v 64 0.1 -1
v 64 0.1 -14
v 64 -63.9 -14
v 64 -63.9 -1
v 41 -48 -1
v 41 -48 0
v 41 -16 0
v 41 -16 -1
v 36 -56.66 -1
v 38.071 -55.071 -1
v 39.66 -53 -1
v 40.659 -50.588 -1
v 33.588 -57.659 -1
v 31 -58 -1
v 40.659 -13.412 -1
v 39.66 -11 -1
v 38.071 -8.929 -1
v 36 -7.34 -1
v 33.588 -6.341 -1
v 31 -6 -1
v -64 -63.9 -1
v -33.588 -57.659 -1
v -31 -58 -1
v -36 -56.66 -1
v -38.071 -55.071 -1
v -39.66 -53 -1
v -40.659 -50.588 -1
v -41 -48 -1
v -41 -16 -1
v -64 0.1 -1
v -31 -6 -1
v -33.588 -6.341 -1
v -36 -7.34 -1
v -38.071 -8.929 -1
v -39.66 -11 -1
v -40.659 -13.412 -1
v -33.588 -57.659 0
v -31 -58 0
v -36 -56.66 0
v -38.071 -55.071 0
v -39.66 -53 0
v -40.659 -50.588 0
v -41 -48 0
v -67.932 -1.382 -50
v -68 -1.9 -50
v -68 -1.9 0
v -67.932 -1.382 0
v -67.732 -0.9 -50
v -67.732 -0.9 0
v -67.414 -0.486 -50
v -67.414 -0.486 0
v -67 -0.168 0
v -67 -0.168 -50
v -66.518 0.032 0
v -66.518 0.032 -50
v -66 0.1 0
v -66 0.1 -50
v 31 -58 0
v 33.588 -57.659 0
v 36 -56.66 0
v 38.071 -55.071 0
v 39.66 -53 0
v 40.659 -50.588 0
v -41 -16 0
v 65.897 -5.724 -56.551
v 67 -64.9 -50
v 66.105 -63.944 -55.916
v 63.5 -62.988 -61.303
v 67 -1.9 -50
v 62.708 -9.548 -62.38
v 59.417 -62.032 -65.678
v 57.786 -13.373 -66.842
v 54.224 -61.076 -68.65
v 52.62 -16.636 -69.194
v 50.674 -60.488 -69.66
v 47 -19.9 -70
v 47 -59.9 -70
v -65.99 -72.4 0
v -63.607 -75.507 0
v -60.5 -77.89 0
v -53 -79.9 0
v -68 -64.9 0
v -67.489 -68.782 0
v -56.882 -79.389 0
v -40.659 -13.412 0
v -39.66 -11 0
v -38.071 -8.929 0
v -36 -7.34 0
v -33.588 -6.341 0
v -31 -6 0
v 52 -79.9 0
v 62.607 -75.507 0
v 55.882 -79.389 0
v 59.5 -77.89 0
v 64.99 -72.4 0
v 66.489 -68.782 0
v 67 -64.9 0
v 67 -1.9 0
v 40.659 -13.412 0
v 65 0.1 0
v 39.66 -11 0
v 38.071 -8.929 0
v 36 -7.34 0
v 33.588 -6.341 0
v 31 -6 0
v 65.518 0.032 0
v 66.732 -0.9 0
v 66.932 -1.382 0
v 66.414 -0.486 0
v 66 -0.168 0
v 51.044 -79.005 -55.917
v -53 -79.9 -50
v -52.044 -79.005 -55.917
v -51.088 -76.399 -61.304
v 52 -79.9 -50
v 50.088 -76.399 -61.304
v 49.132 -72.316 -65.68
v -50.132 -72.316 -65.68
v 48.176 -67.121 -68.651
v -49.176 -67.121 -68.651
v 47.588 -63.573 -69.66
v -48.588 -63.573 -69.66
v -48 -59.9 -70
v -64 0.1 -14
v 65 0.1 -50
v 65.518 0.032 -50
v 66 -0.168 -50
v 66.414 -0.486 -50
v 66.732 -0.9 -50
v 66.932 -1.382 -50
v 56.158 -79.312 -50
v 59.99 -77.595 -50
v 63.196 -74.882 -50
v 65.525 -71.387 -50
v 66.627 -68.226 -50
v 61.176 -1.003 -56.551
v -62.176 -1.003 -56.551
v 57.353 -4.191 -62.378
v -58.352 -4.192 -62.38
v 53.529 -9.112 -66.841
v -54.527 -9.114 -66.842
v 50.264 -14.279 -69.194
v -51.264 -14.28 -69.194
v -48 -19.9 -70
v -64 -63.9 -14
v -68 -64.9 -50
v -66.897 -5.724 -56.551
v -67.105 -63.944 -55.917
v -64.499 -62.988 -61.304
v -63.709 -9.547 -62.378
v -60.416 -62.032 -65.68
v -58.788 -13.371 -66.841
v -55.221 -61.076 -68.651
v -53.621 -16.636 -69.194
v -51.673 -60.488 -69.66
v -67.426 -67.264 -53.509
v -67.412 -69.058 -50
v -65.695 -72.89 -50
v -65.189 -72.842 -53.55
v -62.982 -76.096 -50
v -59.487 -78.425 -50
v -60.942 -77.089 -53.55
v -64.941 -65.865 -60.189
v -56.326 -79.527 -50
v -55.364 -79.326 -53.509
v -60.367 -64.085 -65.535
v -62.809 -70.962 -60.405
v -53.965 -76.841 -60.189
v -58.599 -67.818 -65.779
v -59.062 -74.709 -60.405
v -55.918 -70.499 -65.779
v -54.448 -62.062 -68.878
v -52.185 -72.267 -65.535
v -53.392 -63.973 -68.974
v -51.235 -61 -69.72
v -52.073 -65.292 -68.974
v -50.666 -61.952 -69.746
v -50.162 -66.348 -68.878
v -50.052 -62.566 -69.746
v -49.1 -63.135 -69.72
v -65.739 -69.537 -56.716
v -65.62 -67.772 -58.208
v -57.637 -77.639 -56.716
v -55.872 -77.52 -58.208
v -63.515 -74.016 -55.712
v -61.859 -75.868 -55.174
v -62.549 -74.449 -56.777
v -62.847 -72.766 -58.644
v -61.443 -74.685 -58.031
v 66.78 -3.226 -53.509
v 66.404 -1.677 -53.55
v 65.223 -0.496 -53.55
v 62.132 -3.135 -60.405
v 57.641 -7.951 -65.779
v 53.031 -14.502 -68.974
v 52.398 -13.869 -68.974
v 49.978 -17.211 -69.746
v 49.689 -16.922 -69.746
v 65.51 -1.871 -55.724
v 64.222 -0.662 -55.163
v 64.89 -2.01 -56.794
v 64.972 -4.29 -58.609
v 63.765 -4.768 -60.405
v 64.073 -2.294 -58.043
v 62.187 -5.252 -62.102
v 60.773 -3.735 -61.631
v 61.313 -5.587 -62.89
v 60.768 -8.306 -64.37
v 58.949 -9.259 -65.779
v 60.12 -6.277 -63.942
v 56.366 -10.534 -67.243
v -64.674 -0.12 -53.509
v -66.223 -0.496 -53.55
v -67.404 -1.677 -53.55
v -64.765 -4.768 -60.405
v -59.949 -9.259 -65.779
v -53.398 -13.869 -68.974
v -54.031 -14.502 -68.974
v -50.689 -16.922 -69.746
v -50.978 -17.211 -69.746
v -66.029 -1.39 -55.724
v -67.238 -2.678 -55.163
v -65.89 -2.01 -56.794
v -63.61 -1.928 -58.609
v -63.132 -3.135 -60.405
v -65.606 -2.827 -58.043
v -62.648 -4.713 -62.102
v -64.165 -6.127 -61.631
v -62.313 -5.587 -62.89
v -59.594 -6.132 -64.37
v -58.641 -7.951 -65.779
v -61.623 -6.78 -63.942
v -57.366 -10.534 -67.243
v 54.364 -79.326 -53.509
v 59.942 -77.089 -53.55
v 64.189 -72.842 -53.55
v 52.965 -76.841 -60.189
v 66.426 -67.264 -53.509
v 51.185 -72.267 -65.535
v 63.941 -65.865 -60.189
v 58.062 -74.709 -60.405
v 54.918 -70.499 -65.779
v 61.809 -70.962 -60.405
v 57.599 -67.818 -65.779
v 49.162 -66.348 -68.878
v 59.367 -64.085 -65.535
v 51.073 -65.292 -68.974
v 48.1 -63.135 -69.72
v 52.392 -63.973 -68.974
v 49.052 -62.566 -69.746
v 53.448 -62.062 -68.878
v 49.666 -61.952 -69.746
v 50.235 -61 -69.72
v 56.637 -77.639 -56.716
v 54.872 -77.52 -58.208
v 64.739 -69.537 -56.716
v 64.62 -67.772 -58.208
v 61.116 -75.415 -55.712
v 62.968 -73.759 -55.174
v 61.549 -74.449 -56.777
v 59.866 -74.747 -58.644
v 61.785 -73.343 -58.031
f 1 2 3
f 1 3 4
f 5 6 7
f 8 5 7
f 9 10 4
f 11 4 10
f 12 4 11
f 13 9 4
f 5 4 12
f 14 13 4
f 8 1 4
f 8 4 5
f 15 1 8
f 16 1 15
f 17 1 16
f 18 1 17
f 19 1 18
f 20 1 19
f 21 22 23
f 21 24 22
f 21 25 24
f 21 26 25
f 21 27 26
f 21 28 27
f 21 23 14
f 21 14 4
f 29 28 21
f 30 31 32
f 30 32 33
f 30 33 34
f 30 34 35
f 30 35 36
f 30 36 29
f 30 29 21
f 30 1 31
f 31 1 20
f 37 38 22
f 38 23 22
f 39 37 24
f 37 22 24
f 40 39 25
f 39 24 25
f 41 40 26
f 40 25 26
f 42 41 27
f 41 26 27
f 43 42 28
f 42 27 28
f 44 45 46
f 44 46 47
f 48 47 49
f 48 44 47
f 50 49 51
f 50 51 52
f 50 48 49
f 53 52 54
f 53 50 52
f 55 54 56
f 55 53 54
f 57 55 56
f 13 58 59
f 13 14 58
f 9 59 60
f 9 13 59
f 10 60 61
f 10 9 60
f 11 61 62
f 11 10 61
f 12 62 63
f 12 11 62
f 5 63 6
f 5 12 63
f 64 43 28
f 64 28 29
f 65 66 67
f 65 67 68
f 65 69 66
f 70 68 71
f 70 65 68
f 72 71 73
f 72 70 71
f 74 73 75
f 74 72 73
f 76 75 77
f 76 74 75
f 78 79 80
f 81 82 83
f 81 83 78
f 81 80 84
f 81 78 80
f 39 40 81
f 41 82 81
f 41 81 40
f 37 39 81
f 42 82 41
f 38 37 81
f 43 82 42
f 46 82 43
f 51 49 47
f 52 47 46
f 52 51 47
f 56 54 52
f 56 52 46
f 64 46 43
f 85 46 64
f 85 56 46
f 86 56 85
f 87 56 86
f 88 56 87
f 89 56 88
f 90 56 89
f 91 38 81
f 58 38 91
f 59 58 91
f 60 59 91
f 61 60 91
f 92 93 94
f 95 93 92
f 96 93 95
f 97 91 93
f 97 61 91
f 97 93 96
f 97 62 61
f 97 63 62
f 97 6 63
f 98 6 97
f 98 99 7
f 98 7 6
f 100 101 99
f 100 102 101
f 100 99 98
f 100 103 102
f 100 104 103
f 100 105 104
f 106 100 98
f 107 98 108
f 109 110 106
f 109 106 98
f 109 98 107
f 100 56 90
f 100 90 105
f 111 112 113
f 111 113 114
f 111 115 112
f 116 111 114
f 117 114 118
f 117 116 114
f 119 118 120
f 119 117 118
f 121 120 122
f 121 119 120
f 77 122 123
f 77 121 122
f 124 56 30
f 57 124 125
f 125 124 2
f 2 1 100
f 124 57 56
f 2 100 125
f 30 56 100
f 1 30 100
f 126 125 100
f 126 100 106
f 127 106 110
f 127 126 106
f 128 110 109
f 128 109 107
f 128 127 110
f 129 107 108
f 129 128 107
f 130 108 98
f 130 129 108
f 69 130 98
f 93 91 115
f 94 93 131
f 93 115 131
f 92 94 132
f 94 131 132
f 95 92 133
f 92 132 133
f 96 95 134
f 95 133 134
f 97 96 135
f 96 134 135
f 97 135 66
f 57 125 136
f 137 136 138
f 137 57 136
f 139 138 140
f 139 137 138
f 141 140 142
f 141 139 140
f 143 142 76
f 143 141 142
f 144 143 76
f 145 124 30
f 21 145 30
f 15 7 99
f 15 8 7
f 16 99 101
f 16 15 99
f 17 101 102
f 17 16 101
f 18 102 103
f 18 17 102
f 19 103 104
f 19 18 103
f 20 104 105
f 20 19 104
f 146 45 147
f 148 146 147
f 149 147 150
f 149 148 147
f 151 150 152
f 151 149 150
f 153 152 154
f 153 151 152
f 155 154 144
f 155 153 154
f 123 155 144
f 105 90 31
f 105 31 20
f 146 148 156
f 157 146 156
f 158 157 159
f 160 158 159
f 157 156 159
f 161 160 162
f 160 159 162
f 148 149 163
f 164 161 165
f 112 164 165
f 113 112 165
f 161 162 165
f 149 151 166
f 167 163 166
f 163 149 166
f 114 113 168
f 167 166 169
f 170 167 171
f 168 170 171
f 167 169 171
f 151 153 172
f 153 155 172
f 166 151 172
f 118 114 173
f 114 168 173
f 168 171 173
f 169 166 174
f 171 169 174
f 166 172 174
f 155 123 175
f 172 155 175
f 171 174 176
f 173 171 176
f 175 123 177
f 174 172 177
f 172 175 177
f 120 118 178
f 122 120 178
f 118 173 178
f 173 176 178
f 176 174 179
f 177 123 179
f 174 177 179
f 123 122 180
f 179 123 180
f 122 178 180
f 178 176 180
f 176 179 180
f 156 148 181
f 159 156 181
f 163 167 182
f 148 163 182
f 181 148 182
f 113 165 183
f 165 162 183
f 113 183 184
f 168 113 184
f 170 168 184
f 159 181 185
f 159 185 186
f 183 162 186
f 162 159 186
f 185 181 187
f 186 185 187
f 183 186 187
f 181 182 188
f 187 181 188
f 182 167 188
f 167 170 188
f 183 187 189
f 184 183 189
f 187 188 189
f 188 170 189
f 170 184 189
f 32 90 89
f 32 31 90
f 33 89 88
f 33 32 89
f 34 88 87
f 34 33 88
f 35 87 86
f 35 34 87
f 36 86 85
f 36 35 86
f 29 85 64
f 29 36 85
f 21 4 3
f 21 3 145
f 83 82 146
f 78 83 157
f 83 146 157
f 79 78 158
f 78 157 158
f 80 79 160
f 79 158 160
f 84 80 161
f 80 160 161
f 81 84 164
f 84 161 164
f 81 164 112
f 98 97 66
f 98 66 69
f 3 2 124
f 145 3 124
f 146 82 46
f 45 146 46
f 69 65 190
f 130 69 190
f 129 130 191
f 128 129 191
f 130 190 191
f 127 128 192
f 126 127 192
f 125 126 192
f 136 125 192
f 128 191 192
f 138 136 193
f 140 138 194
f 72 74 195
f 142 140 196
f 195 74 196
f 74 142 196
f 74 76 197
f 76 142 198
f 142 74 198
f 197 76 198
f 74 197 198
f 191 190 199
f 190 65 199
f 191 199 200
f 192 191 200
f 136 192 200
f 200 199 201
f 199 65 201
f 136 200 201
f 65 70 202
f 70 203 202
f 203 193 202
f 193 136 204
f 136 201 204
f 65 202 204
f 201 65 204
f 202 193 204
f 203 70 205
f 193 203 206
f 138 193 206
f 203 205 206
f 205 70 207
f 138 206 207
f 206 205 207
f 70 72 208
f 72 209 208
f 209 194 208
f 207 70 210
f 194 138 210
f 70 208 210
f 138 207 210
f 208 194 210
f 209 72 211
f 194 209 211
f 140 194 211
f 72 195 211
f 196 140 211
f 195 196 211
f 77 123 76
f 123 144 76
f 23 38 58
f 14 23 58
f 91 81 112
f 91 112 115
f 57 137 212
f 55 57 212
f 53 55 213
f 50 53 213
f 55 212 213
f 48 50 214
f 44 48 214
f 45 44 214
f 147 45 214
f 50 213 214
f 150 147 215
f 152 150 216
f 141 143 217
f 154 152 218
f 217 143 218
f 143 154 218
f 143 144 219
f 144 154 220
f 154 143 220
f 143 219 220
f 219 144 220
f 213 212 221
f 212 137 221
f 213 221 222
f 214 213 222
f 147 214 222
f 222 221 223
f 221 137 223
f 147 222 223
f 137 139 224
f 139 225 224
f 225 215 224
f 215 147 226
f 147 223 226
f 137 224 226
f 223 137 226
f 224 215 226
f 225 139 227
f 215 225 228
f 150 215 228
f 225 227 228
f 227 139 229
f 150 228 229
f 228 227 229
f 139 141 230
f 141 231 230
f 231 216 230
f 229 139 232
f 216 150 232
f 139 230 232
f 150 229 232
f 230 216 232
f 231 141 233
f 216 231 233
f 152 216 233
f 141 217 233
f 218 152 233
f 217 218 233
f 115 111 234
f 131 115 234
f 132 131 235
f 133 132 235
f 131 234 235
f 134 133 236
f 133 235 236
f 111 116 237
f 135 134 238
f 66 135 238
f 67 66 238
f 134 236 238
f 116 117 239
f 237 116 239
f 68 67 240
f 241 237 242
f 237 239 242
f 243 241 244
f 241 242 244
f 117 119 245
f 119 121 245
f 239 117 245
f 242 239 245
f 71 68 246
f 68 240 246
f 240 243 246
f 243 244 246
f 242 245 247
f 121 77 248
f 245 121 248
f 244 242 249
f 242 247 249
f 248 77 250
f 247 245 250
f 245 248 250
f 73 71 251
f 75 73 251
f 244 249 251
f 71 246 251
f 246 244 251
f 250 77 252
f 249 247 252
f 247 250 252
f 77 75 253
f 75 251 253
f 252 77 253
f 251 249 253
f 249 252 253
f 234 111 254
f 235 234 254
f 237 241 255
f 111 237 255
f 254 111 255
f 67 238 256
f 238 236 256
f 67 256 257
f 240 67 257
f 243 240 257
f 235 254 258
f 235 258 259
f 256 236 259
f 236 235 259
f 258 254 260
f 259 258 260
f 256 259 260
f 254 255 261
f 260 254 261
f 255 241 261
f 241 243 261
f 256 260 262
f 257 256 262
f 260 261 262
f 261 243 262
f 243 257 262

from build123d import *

# Parameters (mm, degrees)
SKETCH002_W     = 135
SKETCH002_H     = 80
PAD_DEPTH       = 70
SKETCH003_W     = 128
SKETCH003_H     = 13
POCKET_DEPTH    = 64
SKETCH001_W     = 82
SKETCH001_H     = 52
POCKET001_DEPTH = 1
FILLET_R        = 10
FILLET001_R     = 2
FILLET002_R     = 15
FILLET003_R     = 20


with BuildPart() as part:
    # Sketch002 → Pad (new body)
    with BuildSketch(Plane.XY):
        with Locations((-0.5, -39.9)):
            Rectangle(SKETCH002_W, SKETCH002_H)
    extrude(amount=-PAD_DEPTH)

    # Sketch003 → Pocket (cut)
    with BuildSketch(Plane(origin=(0, 0.1, 0), x_dir=(-1, 0, 0), z_dir=(0, 1, 0))):
        with Locations((0, -7.5)):
            Rectangle(SKETCH003_W, SKETCH003_H)
    extrude(amount=-POCKET_DEPTH, mode=Mode.SUBTRACT)

    # Sketch001 → Pocket001 (cut)
    with BuildSketch(Plane.XY):
        with Locations((0, -32)):
            Rectangle(SKETCH001_W, SKETCH001_H)
    extrude(amount=-POCKET001_DEPTH, mode=Mode.SUBTRACT)

    # Fillet
    fillet_edges = [part.edges().sort_by_distance(p)[0] for p in [
        (-41, -58, -0.5),
        (41, -58, -0.5),
        (-41, -6, -0.5),
        (41, -6, -0.5),
    ]]
    fillet(fillet_edges, radius=FILLET_R)

    # Fillet001
    fillet001_edges = [part.edges().sort_by_distance(p)[0] for p in [
        (-68, 0.1, -35),
        (67, 0.1, -35),
    ]]
    fillet(fillet001_edges, radius=FILLET001_R)

    # Fillet002
    fillet002_edges = [part.edges().sort_by_distance(p)[0] for p in [
        (67, -79.9, -35),
        (-68, -79.9, -35),
    ]]
    fillet(fillet002_edges, radius=FILLET002_R)

    # Fillet003
    fillet003_edges = [part.edges().sort_by_distance(p)[0] for p in [
        (-0.5, -79.9, -70),
        (-0.5, 0.1, -70),
    ]]
    fillet(fillet003_edges, radius=FILLET003_R)


solid = part.part
